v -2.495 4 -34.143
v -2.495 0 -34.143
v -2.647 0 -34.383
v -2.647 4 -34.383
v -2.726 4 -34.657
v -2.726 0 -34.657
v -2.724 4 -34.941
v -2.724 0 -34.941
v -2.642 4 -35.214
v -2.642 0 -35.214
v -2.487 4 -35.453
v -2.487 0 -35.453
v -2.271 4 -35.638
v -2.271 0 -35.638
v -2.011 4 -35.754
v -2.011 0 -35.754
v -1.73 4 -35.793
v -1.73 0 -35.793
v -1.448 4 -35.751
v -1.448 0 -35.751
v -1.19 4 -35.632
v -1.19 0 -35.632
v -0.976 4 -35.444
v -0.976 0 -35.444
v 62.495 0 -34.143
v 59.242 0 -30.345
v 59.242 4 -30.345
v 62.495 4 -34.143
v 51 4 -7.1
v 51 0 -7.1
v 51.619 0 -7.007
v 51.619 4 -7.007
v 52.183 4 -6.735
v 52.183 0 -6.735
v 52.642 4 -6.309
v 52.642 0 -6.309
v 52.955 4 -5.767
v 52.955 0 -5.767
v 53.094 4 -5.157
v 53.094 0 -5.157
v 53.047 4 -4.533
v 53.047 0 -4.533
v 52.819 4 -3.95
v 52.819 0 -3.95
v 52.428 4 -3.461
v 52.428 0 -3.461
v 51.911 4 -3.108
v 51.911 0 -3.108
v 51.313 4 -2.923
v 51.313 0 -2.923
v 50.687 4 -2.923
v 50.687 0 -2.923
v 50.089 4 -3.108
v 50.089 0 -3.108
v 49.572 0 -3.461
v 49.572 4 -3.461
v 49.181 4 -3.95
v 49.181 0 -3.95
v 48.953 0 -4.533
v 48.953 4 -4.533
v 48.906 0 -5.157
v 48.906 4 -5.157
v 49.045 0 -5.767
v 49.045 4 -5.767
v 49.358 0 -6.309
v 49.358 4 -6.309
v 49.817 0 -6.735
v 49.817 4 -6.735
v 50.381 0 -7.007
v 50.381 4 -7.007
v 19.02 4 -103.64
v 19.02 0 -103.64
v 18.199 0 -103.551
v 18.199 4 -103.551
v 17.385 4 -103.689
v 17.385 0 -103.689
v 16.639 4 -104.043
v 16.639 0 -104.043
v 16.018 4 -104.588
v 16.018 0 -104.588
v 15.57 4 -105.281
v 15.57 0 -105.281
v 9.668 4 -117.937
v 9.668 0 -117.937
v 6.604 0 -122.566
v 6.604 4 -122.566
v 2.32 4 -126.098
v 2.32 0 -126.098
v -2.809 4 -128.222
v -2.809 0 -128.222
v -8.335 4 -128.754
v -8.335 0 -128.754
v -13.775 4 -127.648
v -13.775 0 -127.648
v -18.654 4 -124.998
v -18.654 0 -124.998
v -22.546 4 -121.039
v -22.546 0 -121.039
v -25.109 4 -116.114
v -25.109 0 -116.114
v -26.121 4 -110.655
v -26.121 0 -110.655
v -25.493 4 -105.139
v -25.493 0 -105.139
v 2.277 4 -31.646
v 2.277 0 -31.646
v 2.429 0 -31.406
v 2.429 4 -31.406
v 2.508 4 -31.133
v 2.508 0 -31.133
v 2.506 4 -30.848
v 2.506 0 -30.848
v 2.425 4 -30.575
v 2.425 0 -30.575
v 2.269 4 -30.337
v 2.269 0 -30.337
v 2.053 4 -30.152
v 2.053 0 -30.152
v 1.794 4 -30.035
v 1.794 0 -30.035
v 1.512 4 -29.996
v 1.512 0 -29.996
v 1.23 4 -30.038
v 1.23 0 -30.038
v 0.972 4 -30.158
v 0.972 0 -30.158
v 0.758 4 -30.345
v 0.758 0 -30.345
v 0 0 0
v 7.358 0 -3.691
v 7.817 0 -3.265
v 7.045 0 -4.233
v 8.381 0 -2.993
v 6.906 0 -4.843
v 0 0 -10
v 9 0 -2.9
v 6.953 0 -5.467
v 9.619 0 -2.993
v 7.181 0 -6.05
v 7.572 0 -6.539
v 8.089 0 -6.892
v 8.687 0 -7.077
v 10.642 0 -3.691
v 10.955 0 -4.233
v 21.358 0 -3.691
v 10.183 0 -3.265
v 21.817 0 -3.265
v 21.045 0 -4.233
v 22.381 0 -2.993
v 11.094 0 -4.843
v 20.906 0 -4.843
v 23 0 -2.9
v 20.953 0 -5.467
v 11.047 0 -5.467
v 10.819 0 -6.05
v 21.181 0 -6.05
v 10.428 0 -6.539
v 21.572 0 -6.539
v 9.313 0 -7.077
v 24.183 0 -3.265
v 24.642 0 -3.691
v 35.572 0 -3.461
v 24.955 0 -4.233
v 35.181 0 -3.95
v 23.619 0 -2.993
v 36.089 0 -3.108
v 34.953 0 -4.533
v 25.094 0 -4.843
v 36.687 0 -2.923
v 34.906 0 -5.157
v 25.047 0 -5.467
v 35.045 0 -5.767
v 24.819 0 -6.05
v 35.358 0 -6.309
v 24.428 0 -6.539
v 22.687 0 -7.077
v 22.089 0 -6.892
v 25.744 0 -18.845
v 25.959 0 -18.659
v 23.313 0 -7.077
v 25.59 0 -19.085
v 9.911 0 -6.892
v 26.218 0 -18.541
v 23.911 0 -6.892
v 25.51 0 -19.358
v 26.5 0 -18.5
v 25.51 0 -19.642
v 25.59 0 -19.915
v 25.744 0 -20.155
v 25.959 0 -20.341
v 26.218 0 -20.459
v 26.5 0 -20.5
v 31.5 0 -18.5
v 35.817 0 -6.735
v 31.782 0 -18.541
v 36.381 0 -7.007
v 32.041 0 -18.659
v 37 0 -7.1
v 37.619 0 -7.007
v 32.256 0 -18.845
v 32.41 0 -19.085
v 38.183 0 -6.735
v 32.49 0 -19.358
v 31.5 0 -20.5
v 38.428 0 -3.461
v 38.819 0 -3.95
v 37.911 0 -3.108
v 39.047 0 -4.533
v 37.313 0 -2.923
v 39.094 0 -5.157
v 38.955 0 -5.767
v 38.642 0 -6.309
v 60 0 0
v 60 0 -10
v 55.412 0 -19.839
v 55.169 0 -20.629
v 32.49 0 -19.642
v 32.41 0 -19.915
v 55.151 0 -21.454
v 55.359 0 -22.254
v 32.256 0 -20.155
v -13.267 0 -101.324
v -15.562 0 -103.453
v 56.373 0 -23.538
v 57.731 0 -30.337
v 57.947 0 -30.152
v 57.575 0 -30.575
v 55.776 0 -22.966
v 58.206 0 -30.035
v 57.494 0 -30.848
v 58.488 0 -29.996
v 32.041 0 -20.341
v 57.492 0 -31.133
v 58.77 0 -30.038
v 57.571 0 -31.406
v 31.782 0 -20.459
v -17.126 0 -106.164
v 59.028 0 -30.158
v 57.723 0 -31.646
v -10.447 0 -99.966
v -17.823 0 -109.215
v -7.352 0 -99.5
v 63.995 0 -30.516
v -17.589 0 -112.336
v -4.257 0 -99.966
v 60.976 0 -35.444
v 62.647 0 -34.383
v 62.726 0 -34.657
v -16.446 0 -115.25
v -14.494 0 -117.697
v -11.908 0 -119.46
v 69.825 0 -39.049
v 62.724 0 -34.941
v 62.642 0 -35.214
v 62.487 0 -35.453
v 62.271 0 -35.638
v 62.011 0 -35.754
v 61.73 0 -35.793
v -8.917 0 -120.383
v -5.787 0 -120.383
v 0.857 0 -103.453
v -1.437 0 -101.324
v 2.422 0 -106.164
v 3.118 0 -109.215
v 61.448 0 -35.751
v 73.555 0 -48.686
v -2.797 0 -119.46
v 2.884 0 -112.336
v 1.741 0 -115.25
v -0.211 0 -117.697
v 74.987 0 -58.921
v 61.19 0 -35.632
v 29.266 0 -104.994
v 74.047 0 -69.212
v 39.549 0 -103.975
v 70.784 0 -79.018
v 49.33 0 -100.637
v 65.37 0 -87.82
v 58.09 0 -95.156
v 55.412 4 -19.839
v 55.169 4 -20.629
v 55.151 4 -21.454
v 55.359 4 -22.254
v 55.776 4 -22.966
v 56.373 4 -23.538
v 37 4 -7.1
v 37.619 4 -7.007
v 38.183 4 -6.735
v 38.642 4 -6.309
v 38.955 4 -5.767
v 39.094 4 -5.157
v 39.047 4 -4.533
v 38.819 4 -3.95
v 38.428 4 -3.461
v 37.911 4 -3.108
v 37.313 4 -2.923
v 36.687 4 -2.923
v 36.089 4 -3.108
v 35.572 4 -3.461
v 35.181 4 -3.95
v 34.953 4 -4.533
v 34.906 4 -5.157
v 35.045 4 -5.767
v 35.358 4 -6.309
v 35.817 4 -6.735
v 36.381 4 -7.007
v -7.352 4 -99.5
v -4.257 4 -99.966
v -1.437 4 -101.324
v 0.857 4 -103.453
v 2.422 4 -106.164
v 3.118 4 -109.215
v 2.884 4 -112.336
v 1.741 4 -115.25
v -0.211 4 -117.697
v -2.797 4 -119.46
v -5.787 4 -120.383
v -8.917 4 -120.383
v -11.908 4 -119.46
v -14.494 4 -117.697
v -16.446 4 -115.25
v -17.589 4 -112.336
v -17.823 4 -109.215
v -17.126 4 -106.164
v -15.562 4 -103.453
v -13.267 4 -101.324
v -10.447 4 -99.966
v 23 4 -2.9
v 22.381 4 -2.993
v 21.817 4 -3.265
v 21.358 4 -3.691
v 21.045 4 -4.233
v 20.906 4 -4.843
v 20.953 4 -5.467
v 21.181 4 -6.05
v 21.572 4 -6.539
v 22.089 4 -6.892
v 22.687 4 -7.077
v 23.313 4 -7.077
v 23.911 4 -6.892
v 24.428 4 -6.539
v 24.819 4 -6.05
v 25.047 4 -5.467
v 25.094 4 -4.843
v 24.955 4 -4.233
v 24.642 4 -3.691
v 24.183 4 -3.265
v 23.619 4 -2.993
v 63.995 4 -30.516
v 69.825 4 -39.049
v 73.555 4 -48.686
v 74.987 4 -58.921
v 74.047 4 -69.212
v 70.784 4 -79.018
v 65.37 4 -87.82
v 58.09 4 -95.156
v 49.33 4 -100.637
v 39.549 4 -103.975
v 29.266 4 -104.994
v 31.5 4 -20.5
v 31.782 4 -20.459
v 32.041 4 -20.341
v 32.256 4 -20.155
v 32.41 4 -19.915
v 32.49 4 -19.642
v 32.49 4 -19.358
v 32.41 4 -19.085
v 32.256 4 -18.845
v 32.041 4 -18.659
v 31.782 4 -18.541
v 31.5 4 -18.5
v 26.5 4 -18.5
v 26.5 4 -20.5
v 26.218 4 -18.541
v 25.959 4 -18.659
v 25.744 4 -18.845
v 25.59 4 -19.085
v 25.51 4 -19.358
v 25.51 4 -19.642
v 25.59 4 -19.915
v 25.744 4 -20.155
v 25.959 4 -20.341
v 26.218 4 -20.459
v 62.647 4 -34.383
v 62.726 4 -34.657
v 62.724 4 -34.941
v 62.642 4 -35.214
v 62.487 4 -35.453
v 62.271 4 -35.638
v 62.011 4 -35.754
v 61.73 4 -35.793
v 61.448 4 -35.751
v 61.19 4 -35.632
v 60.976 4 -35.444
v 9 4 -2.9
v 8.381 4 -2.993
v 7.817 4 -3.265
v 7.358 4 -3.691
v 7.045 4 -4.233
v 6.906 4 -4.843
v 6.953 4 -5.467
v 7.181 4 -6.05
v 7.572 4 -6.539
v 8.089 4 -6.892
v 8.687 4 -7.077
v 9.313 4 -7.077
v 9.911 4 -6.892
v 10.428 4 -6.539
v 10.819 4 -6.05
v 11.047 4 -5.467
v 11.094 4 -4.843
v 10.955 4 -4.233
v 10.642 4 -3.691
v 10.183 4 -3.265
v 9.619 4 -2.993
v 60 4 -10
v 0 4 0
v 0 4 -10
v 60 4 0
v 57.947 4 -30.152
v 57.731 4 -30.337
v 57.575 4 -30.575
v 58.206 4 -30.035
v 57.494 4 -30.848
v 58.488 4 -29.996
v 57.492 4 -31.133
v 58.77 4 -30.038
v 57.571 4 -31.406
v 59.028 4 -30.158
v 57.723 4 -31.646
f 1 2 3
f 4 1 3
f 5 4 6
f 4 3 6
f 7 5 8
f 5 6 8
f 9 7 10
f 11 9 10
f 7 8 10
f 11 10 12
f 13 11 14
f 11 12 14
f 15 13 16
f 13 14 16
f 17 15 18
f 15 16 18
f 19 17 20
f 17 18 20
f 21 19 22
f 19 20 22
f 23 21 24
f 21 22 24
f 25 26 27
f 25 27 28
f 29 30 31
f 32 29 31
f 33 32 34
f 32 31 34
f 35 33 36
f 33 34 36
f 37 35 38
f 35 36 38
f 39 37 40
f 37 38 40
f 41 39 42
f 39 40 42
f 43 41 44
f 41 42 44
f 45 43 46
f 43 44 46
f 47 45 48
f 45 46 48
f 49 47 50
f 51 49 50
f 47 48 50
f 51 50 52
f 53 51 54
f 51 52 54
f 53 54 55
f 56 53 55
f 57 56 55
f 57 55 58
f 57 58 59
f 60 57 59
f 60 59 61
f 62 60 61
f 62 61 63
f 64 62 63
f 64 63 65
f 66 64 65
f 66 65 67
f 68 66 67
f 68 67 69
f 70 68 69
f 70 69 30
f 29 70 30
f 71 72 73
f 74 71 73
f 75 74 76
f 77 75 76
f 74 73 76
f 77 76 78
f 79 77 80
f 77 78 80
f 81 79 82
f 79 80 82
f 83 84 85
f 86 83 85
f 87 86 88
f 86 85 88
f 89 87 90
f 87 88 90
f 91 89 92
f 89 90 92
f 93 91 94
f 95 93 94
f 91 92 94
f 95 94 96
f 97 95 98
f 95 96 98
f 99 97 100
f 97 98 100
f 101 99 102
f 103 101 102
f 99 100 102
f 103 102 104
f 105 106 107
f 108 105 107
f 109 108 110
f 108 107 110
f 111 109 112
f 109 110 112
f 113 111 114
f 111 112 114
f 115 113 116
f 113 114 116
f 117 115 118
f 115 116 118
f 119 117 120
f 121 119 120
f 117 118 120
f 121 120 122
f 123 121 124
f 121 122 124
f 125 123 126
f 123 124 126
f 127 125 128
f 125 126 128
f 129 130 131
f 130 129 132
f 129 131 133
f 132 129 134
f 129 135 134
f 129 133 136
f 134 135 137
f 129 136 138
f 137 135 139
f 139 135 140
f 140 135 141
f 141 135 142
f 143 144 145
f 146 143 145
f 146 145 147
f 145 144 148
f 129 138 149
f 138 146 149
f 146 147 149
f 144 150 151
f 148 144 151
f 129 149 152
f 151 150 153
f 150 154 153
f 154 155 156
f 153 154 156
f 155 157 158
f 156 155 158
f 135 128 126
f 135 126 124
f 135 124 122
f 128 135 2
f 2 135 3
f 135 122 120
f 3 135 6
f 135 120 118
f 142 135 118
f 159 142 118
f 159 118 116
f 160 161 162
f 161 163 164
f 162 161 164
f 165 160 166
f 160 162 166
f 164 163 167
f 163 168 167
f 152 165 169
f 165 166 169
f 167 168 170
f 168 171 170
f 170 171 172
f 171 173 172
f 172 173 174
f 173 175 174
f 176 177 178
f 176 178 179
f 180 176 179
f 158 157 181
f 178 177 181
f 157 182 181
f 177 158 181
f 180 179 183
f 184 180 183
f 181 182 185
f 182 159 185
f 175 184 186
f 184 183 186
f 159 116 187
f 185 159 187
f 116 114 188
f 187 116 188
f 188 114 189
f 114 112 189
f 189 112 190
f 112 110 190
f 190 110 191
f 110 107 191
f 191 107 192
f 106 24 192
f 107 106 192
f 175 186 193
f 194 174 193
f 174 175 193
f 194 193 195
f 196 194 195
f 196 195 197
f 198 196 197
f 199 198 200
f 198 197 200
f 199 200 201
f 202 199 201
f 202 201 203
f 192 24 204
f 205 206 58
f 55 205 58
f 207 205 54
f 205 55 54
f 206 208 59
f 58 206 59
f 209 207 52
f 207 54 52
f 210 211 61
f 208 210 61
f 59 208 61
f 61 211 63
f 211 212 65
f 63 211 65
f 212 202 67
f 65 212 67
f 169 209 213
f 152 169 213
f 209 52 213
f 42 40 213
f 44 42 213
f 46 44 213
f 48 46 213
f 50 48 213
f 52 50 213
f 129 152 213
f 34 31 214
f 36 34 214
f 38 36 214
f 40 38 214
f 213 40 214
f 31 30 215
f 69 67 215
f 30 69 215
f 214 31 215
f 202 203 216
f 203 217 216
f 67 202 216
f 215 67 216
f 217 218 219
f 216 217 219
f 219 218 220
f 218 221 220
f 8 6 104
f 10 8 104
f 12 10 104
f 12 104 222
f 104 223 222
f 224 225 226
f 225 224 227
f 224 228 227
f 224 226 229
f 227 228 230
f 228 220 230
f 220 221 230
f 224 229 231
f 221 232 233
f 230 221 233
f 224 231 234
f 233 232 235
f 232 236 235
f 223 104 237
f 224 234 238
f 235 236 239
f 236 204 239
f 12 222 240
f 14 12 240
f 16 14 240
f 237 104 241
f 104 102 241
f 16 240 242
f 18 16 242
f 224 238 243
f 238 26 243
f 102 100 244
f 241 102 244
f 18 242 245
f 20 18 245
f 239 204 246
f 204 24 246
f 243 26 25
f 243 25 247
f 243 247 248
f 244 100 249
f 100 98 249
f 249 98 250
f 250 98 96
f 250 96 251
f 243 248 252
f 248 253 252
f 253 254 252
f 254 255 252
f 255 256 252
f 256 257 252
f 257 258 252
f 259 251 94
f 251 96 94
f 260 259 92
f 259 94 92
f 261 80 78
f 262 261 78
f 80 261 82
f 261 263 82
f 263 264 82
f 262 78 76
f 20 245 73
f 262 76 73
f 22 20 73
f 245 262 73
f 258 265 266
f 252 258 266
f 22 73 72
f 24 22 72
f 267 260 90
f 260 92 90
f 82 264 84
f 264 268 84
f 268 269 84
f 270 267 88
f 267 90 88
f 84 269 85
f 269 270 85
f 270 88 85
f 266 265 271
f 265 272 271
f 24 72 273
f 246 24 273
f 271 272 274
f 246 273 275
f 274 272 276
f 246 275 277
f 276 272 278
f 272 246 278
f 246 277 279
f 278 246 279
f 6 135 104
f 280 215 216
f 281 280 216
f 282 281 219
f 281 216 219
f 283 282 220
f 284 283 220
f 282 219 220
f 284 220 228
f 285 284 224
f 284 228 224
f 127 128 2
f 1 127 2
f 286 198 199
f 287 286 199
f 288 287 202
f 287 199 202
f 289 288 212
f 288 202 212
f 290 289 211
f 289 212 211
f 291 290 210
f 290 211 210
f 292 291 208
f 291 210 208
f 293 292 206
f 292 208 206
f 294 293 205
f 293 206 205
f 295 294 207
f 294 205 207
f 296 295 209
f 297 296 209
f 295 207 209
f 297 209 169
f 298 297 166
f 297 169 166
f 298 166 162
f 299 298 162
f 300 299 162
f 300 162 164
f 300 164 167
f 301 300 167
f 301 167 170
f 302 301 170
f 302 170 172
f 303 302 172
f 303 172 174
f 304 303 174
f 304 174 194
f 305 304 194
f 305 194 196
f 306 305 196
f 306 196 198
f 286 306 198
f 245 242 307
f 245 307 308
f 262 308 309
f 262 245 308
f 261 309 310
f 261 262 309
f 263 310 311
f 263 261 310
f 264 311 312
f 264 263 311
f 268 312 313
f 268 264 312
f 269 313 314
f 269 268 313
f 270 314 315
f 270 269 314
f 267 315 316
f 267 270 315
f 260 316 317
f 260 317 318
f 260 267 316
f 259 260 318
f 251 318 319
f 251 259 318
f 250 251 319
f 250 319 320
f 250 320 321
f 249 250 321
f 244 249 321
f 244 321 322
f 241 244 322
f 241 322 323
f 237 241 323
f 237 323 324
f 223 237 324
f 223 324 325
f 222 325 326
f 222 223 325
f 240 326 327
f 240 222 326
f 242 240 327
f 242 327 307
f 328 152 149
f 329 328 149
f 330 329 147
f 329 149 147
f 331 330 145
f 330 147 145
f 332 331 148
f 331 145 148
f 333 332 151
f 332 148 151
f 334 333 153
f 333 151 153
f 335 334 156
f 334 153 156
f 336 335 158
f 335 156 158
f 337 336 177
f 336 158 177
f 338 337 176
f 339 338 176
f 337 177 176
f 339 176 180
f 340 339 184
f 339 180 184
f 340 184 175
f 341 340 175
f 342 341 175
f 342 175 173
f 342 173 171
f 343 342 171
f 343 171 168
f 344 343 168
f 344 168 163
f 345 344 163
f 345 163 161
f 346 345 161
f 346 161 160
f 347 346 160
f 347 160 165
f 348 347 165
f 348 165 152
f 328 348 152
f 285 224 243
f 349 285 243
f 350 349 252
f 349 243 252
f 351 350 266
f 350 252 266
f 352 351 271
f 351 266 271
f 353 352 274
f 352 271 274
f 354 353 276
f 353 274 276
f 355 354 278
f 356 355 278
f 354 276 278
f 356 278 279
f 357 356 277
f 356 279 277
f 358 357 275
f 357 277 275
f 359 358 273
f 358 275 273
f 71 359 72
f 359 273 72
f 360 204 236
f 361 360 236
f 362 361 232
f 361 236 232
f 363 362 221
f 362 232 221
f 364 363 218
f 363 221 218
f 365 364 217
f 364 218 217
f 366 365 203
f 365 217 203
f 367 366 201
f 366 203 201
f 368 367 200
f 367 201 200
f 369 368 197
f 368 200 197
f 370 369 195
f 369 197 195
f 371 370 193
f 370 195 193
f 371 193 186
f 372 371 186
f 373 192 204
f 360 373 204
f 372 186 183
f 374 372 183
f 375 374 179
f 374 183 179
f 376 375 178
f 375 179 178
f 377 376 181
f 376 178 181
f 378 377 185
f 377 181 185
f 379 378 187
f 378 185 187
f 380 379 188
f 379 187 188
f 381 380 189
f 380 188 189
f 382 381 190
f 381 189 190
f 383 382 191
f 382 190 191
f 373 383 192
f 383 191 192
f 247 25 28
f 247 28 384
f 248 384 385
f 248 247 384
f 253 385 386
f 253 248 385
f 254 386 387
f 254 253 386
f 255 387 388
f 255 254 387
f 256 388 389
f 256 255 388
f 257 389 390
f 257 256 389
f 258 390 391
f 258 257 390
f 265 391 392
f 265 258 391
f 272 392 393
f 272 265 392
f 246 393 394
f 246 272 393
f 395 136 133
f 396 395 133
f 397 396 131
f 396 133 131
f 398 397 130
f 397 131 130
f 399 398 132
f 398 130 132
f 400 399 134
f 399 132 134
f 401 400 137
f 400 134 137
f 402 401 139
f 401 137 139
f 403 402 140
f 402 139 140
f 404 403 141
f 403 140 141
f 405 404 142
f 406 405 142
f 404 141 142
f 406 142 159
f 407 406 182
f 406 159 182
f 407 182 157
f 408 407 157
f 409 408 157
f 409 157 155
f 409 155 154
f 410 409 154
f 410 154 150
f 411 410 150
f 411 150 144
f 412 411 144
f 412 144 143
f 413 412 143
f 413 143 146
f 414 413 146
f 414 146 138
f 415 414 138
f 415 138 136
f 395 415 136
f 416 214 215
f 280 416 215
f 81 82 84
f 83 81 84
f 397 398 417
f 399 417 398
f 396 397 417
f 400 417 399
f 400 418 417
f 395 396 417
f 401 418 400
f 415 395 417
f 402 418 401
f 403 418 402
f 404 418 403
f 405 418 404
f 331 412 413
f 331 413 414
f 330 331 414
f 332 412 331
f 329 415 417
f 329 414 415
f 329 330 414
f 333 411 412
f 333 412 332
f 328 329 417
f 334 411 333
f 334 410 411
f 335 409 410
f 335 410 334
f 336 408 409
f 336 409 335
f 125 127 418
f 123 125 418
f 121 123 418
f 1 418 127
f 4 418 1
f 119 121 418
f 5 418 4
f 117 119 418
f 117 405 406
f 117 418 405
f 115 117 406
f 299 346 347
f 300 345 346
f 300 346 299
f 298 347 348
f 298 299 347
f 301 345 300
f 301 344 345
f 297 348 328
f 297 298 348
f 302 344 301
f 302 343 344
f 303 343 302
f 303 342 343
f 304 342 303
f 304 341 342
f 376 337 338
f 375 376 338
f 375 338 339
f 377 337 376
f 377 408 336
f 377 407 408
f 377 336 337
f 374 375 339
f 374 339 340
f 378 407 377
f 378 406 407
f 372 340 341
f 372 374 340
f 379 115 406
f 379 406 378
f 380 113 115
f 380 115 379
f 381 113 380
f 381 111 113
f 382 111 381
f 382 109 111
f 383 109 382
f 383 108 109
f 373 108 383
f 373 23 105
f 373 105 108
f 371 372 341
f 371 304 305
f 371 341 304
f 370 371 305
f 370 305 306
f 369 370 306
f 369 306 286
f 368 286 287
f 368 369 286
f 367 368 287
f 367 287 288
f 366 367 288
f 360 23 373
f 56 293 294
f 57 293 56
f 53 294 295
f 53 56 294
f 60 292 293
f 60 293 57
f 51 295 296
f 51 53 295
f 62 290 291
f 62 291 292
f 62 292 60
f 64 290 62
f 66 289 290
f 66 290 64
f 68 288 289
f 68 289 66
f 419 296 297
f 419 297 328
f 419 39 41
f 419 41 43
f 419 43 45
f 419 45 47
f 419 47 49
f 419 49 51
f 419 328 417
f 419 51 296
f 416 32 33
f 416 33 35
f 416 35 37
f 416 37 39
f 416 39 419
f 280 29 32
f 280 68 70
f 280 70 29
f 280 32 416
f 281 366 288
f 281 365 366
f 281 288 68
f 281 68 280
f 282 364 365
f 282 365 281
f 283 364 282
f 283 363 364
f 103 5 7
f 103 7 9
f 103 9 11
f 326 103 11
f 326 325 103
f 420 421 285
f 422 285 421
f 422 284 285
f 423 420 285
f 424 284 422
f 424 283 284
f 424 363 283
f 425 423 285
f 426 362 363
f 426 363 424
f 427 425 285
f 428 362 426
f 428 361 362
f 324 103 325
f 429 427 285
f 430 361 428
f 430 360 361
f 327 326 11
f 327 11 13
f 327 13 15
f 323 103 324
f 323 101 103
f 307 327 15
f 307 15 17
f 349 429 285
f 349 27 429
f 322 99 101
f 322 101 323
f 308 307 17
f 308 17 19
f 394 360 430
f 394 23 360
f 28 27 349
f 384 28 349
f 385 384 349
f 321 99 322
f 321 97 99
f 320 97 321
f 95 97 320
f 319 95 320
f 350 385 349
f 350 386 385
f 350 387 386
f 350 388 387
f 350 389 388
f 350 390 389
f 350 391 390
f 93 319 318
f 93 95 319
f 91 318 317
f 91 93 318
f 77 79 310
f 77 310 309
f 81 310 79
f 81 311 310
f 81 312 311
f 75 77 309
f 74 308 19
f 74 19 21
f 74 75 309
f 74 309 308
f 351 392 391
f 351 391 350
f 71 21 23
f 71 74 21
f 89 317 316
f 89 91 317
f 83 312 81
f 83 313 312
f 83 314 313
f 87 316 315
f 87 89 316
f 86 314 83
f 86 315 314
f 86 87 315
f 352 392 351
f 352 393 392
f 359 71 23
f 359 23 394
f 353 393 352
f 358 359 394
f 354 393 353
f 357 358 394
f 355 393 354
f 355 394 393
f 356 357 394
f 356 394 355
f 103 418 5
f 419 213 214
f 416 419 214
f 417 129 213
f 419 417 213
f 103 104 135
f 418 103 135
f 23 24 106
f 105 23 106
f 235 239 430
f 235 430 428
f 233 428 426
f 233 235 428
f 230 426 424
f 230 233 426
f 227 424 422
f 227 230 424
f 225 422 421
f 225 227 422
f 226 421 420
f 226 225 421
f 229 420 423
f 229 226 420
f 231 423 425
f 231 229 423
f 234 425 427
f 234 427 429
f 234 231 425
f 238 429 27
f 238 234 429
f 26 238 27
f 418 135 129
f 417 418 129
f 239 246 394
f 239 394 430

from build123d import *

# Parameters (mm, degrees)
SKETCH_1_R             = 10.5
EXTRUDE_1_DEPTH        = 4
SKETCH_4_R             = 2.1
CUT_EXTRUDE_1346_DEPTH = 150.081575092


with BuildPart() as part:
    # 草图1 → 凸台-拉伸1 (new body)
    with BuildSketch(Plane(origin=(0, 0, 0), x_dir=(1, 0, 0), z_dir=(0, 1, 0))):
        with BuildLine():
            Line((0, 0), (60, 0))
            Line((60, 0), (60, 10))
            Line((60, 10), (55.411884484, 19.839245477))
            ThreePointArc((55.411884484, 19.839245477), (55.227167567, 21.861337052), (56.372632354, 23.537906496))
            ThreePointArc((56.372632354, 23.537906496), (70.783850417, 79.017821778), (19.020417199, 103.639990393))
            ThreePointArc((19.020417199, 103.639990393), (16.99979992, 103.840191523), (15.569521651, 105.281468301))
            Line((15.569521651, 105.281468301), (9.668235965, 117.936816295))
            ThreePointArc((9.668235965, 117.936816295), (-13.775496492, 127.647528231), (-25.492512153, 105.139350566))
            Line((-25.492512153, 105.139350566), (0, 10))
            Line((0, 10), (0, 0))
        make_face()
        with Locations(Location((-7.352321507, 110, 0), (0, 0, 270))):
            Circle(SKETCH_1_R, mode=Mode.SUBTRACT)
        with BuildLine():
            Line((26.5, 20.5), (31.5, 20.5))
            ThreePointArc((31.5, 20.5), (32.5, 19.5), (31.5, 18.5))
            Line((31.5, 18.5), (26.5, 18.5))
            ThreePointArc((26.5, 18.5), (25.5, 19.5), (26.5, 20.5))
        make_face(mode=Mode.SUBTRACT)
        with BuildLine():
            Line((-0.975772037, 35.443910191), (2.27680142, 31.646441837))
            ThreePointArc((2.27680142, 31.646441837), (2.167822441, 30.236433474), (0.757814079, 30.345412454))
            Line((0.757814079, 30.345412454), (-2.494759379, 34.142880808))
            ThreePointArc((-2.494759379, 34.142880808), (-2.3857804, 35.552889171), (-0.975772037, 35.443910191))
        make_face(mode=Mode.SUBTRACT)
        with BuildLine():
            Line((60.975772037, 35.443910191), (57.72319858, 31.646441837))
            ThreePointArc((57.72319858, 31.646441837), (57.832177559, 30.236433474), (59.242185921, 30.345412454))
            Line((59.242185921, 30.345412454), (62.494759379, 34.142880808))
            ThreePointArc((62.494759379, 34.142880808), (62.3857804, 35.552889171), (60.975772037, 35.443910191))
        make_face(mode=Mode.SUBTRACT)
    extrude(amount=EXTRUDE_1_DEPTH)

    # 草图4 → Cut-Extrude 1346 (cut, through all)
    with BuildSketch(Plane.XZ):
        with Locations(Location((37, -5, 0), (0, 0, 270))):
            Circle(SKETCH_4_R)
        with Locations(Location((51, -5, 0), (0, 0, 270))):
            Circle(SKETCH_4_R)
        with Locations(Location((9, -5, 0), (0, 0, 90))):
            Circle(SKETCH_4_R)
        with Locations(Location((23, -5, 0), (0, 0, 90))):
            Circle(SKETCH_4_R)
    extrude(amount=-CUT_EXTRUDE_1346_DEPTH, mode=Mode.SUBTRACT)


solid = part.part
